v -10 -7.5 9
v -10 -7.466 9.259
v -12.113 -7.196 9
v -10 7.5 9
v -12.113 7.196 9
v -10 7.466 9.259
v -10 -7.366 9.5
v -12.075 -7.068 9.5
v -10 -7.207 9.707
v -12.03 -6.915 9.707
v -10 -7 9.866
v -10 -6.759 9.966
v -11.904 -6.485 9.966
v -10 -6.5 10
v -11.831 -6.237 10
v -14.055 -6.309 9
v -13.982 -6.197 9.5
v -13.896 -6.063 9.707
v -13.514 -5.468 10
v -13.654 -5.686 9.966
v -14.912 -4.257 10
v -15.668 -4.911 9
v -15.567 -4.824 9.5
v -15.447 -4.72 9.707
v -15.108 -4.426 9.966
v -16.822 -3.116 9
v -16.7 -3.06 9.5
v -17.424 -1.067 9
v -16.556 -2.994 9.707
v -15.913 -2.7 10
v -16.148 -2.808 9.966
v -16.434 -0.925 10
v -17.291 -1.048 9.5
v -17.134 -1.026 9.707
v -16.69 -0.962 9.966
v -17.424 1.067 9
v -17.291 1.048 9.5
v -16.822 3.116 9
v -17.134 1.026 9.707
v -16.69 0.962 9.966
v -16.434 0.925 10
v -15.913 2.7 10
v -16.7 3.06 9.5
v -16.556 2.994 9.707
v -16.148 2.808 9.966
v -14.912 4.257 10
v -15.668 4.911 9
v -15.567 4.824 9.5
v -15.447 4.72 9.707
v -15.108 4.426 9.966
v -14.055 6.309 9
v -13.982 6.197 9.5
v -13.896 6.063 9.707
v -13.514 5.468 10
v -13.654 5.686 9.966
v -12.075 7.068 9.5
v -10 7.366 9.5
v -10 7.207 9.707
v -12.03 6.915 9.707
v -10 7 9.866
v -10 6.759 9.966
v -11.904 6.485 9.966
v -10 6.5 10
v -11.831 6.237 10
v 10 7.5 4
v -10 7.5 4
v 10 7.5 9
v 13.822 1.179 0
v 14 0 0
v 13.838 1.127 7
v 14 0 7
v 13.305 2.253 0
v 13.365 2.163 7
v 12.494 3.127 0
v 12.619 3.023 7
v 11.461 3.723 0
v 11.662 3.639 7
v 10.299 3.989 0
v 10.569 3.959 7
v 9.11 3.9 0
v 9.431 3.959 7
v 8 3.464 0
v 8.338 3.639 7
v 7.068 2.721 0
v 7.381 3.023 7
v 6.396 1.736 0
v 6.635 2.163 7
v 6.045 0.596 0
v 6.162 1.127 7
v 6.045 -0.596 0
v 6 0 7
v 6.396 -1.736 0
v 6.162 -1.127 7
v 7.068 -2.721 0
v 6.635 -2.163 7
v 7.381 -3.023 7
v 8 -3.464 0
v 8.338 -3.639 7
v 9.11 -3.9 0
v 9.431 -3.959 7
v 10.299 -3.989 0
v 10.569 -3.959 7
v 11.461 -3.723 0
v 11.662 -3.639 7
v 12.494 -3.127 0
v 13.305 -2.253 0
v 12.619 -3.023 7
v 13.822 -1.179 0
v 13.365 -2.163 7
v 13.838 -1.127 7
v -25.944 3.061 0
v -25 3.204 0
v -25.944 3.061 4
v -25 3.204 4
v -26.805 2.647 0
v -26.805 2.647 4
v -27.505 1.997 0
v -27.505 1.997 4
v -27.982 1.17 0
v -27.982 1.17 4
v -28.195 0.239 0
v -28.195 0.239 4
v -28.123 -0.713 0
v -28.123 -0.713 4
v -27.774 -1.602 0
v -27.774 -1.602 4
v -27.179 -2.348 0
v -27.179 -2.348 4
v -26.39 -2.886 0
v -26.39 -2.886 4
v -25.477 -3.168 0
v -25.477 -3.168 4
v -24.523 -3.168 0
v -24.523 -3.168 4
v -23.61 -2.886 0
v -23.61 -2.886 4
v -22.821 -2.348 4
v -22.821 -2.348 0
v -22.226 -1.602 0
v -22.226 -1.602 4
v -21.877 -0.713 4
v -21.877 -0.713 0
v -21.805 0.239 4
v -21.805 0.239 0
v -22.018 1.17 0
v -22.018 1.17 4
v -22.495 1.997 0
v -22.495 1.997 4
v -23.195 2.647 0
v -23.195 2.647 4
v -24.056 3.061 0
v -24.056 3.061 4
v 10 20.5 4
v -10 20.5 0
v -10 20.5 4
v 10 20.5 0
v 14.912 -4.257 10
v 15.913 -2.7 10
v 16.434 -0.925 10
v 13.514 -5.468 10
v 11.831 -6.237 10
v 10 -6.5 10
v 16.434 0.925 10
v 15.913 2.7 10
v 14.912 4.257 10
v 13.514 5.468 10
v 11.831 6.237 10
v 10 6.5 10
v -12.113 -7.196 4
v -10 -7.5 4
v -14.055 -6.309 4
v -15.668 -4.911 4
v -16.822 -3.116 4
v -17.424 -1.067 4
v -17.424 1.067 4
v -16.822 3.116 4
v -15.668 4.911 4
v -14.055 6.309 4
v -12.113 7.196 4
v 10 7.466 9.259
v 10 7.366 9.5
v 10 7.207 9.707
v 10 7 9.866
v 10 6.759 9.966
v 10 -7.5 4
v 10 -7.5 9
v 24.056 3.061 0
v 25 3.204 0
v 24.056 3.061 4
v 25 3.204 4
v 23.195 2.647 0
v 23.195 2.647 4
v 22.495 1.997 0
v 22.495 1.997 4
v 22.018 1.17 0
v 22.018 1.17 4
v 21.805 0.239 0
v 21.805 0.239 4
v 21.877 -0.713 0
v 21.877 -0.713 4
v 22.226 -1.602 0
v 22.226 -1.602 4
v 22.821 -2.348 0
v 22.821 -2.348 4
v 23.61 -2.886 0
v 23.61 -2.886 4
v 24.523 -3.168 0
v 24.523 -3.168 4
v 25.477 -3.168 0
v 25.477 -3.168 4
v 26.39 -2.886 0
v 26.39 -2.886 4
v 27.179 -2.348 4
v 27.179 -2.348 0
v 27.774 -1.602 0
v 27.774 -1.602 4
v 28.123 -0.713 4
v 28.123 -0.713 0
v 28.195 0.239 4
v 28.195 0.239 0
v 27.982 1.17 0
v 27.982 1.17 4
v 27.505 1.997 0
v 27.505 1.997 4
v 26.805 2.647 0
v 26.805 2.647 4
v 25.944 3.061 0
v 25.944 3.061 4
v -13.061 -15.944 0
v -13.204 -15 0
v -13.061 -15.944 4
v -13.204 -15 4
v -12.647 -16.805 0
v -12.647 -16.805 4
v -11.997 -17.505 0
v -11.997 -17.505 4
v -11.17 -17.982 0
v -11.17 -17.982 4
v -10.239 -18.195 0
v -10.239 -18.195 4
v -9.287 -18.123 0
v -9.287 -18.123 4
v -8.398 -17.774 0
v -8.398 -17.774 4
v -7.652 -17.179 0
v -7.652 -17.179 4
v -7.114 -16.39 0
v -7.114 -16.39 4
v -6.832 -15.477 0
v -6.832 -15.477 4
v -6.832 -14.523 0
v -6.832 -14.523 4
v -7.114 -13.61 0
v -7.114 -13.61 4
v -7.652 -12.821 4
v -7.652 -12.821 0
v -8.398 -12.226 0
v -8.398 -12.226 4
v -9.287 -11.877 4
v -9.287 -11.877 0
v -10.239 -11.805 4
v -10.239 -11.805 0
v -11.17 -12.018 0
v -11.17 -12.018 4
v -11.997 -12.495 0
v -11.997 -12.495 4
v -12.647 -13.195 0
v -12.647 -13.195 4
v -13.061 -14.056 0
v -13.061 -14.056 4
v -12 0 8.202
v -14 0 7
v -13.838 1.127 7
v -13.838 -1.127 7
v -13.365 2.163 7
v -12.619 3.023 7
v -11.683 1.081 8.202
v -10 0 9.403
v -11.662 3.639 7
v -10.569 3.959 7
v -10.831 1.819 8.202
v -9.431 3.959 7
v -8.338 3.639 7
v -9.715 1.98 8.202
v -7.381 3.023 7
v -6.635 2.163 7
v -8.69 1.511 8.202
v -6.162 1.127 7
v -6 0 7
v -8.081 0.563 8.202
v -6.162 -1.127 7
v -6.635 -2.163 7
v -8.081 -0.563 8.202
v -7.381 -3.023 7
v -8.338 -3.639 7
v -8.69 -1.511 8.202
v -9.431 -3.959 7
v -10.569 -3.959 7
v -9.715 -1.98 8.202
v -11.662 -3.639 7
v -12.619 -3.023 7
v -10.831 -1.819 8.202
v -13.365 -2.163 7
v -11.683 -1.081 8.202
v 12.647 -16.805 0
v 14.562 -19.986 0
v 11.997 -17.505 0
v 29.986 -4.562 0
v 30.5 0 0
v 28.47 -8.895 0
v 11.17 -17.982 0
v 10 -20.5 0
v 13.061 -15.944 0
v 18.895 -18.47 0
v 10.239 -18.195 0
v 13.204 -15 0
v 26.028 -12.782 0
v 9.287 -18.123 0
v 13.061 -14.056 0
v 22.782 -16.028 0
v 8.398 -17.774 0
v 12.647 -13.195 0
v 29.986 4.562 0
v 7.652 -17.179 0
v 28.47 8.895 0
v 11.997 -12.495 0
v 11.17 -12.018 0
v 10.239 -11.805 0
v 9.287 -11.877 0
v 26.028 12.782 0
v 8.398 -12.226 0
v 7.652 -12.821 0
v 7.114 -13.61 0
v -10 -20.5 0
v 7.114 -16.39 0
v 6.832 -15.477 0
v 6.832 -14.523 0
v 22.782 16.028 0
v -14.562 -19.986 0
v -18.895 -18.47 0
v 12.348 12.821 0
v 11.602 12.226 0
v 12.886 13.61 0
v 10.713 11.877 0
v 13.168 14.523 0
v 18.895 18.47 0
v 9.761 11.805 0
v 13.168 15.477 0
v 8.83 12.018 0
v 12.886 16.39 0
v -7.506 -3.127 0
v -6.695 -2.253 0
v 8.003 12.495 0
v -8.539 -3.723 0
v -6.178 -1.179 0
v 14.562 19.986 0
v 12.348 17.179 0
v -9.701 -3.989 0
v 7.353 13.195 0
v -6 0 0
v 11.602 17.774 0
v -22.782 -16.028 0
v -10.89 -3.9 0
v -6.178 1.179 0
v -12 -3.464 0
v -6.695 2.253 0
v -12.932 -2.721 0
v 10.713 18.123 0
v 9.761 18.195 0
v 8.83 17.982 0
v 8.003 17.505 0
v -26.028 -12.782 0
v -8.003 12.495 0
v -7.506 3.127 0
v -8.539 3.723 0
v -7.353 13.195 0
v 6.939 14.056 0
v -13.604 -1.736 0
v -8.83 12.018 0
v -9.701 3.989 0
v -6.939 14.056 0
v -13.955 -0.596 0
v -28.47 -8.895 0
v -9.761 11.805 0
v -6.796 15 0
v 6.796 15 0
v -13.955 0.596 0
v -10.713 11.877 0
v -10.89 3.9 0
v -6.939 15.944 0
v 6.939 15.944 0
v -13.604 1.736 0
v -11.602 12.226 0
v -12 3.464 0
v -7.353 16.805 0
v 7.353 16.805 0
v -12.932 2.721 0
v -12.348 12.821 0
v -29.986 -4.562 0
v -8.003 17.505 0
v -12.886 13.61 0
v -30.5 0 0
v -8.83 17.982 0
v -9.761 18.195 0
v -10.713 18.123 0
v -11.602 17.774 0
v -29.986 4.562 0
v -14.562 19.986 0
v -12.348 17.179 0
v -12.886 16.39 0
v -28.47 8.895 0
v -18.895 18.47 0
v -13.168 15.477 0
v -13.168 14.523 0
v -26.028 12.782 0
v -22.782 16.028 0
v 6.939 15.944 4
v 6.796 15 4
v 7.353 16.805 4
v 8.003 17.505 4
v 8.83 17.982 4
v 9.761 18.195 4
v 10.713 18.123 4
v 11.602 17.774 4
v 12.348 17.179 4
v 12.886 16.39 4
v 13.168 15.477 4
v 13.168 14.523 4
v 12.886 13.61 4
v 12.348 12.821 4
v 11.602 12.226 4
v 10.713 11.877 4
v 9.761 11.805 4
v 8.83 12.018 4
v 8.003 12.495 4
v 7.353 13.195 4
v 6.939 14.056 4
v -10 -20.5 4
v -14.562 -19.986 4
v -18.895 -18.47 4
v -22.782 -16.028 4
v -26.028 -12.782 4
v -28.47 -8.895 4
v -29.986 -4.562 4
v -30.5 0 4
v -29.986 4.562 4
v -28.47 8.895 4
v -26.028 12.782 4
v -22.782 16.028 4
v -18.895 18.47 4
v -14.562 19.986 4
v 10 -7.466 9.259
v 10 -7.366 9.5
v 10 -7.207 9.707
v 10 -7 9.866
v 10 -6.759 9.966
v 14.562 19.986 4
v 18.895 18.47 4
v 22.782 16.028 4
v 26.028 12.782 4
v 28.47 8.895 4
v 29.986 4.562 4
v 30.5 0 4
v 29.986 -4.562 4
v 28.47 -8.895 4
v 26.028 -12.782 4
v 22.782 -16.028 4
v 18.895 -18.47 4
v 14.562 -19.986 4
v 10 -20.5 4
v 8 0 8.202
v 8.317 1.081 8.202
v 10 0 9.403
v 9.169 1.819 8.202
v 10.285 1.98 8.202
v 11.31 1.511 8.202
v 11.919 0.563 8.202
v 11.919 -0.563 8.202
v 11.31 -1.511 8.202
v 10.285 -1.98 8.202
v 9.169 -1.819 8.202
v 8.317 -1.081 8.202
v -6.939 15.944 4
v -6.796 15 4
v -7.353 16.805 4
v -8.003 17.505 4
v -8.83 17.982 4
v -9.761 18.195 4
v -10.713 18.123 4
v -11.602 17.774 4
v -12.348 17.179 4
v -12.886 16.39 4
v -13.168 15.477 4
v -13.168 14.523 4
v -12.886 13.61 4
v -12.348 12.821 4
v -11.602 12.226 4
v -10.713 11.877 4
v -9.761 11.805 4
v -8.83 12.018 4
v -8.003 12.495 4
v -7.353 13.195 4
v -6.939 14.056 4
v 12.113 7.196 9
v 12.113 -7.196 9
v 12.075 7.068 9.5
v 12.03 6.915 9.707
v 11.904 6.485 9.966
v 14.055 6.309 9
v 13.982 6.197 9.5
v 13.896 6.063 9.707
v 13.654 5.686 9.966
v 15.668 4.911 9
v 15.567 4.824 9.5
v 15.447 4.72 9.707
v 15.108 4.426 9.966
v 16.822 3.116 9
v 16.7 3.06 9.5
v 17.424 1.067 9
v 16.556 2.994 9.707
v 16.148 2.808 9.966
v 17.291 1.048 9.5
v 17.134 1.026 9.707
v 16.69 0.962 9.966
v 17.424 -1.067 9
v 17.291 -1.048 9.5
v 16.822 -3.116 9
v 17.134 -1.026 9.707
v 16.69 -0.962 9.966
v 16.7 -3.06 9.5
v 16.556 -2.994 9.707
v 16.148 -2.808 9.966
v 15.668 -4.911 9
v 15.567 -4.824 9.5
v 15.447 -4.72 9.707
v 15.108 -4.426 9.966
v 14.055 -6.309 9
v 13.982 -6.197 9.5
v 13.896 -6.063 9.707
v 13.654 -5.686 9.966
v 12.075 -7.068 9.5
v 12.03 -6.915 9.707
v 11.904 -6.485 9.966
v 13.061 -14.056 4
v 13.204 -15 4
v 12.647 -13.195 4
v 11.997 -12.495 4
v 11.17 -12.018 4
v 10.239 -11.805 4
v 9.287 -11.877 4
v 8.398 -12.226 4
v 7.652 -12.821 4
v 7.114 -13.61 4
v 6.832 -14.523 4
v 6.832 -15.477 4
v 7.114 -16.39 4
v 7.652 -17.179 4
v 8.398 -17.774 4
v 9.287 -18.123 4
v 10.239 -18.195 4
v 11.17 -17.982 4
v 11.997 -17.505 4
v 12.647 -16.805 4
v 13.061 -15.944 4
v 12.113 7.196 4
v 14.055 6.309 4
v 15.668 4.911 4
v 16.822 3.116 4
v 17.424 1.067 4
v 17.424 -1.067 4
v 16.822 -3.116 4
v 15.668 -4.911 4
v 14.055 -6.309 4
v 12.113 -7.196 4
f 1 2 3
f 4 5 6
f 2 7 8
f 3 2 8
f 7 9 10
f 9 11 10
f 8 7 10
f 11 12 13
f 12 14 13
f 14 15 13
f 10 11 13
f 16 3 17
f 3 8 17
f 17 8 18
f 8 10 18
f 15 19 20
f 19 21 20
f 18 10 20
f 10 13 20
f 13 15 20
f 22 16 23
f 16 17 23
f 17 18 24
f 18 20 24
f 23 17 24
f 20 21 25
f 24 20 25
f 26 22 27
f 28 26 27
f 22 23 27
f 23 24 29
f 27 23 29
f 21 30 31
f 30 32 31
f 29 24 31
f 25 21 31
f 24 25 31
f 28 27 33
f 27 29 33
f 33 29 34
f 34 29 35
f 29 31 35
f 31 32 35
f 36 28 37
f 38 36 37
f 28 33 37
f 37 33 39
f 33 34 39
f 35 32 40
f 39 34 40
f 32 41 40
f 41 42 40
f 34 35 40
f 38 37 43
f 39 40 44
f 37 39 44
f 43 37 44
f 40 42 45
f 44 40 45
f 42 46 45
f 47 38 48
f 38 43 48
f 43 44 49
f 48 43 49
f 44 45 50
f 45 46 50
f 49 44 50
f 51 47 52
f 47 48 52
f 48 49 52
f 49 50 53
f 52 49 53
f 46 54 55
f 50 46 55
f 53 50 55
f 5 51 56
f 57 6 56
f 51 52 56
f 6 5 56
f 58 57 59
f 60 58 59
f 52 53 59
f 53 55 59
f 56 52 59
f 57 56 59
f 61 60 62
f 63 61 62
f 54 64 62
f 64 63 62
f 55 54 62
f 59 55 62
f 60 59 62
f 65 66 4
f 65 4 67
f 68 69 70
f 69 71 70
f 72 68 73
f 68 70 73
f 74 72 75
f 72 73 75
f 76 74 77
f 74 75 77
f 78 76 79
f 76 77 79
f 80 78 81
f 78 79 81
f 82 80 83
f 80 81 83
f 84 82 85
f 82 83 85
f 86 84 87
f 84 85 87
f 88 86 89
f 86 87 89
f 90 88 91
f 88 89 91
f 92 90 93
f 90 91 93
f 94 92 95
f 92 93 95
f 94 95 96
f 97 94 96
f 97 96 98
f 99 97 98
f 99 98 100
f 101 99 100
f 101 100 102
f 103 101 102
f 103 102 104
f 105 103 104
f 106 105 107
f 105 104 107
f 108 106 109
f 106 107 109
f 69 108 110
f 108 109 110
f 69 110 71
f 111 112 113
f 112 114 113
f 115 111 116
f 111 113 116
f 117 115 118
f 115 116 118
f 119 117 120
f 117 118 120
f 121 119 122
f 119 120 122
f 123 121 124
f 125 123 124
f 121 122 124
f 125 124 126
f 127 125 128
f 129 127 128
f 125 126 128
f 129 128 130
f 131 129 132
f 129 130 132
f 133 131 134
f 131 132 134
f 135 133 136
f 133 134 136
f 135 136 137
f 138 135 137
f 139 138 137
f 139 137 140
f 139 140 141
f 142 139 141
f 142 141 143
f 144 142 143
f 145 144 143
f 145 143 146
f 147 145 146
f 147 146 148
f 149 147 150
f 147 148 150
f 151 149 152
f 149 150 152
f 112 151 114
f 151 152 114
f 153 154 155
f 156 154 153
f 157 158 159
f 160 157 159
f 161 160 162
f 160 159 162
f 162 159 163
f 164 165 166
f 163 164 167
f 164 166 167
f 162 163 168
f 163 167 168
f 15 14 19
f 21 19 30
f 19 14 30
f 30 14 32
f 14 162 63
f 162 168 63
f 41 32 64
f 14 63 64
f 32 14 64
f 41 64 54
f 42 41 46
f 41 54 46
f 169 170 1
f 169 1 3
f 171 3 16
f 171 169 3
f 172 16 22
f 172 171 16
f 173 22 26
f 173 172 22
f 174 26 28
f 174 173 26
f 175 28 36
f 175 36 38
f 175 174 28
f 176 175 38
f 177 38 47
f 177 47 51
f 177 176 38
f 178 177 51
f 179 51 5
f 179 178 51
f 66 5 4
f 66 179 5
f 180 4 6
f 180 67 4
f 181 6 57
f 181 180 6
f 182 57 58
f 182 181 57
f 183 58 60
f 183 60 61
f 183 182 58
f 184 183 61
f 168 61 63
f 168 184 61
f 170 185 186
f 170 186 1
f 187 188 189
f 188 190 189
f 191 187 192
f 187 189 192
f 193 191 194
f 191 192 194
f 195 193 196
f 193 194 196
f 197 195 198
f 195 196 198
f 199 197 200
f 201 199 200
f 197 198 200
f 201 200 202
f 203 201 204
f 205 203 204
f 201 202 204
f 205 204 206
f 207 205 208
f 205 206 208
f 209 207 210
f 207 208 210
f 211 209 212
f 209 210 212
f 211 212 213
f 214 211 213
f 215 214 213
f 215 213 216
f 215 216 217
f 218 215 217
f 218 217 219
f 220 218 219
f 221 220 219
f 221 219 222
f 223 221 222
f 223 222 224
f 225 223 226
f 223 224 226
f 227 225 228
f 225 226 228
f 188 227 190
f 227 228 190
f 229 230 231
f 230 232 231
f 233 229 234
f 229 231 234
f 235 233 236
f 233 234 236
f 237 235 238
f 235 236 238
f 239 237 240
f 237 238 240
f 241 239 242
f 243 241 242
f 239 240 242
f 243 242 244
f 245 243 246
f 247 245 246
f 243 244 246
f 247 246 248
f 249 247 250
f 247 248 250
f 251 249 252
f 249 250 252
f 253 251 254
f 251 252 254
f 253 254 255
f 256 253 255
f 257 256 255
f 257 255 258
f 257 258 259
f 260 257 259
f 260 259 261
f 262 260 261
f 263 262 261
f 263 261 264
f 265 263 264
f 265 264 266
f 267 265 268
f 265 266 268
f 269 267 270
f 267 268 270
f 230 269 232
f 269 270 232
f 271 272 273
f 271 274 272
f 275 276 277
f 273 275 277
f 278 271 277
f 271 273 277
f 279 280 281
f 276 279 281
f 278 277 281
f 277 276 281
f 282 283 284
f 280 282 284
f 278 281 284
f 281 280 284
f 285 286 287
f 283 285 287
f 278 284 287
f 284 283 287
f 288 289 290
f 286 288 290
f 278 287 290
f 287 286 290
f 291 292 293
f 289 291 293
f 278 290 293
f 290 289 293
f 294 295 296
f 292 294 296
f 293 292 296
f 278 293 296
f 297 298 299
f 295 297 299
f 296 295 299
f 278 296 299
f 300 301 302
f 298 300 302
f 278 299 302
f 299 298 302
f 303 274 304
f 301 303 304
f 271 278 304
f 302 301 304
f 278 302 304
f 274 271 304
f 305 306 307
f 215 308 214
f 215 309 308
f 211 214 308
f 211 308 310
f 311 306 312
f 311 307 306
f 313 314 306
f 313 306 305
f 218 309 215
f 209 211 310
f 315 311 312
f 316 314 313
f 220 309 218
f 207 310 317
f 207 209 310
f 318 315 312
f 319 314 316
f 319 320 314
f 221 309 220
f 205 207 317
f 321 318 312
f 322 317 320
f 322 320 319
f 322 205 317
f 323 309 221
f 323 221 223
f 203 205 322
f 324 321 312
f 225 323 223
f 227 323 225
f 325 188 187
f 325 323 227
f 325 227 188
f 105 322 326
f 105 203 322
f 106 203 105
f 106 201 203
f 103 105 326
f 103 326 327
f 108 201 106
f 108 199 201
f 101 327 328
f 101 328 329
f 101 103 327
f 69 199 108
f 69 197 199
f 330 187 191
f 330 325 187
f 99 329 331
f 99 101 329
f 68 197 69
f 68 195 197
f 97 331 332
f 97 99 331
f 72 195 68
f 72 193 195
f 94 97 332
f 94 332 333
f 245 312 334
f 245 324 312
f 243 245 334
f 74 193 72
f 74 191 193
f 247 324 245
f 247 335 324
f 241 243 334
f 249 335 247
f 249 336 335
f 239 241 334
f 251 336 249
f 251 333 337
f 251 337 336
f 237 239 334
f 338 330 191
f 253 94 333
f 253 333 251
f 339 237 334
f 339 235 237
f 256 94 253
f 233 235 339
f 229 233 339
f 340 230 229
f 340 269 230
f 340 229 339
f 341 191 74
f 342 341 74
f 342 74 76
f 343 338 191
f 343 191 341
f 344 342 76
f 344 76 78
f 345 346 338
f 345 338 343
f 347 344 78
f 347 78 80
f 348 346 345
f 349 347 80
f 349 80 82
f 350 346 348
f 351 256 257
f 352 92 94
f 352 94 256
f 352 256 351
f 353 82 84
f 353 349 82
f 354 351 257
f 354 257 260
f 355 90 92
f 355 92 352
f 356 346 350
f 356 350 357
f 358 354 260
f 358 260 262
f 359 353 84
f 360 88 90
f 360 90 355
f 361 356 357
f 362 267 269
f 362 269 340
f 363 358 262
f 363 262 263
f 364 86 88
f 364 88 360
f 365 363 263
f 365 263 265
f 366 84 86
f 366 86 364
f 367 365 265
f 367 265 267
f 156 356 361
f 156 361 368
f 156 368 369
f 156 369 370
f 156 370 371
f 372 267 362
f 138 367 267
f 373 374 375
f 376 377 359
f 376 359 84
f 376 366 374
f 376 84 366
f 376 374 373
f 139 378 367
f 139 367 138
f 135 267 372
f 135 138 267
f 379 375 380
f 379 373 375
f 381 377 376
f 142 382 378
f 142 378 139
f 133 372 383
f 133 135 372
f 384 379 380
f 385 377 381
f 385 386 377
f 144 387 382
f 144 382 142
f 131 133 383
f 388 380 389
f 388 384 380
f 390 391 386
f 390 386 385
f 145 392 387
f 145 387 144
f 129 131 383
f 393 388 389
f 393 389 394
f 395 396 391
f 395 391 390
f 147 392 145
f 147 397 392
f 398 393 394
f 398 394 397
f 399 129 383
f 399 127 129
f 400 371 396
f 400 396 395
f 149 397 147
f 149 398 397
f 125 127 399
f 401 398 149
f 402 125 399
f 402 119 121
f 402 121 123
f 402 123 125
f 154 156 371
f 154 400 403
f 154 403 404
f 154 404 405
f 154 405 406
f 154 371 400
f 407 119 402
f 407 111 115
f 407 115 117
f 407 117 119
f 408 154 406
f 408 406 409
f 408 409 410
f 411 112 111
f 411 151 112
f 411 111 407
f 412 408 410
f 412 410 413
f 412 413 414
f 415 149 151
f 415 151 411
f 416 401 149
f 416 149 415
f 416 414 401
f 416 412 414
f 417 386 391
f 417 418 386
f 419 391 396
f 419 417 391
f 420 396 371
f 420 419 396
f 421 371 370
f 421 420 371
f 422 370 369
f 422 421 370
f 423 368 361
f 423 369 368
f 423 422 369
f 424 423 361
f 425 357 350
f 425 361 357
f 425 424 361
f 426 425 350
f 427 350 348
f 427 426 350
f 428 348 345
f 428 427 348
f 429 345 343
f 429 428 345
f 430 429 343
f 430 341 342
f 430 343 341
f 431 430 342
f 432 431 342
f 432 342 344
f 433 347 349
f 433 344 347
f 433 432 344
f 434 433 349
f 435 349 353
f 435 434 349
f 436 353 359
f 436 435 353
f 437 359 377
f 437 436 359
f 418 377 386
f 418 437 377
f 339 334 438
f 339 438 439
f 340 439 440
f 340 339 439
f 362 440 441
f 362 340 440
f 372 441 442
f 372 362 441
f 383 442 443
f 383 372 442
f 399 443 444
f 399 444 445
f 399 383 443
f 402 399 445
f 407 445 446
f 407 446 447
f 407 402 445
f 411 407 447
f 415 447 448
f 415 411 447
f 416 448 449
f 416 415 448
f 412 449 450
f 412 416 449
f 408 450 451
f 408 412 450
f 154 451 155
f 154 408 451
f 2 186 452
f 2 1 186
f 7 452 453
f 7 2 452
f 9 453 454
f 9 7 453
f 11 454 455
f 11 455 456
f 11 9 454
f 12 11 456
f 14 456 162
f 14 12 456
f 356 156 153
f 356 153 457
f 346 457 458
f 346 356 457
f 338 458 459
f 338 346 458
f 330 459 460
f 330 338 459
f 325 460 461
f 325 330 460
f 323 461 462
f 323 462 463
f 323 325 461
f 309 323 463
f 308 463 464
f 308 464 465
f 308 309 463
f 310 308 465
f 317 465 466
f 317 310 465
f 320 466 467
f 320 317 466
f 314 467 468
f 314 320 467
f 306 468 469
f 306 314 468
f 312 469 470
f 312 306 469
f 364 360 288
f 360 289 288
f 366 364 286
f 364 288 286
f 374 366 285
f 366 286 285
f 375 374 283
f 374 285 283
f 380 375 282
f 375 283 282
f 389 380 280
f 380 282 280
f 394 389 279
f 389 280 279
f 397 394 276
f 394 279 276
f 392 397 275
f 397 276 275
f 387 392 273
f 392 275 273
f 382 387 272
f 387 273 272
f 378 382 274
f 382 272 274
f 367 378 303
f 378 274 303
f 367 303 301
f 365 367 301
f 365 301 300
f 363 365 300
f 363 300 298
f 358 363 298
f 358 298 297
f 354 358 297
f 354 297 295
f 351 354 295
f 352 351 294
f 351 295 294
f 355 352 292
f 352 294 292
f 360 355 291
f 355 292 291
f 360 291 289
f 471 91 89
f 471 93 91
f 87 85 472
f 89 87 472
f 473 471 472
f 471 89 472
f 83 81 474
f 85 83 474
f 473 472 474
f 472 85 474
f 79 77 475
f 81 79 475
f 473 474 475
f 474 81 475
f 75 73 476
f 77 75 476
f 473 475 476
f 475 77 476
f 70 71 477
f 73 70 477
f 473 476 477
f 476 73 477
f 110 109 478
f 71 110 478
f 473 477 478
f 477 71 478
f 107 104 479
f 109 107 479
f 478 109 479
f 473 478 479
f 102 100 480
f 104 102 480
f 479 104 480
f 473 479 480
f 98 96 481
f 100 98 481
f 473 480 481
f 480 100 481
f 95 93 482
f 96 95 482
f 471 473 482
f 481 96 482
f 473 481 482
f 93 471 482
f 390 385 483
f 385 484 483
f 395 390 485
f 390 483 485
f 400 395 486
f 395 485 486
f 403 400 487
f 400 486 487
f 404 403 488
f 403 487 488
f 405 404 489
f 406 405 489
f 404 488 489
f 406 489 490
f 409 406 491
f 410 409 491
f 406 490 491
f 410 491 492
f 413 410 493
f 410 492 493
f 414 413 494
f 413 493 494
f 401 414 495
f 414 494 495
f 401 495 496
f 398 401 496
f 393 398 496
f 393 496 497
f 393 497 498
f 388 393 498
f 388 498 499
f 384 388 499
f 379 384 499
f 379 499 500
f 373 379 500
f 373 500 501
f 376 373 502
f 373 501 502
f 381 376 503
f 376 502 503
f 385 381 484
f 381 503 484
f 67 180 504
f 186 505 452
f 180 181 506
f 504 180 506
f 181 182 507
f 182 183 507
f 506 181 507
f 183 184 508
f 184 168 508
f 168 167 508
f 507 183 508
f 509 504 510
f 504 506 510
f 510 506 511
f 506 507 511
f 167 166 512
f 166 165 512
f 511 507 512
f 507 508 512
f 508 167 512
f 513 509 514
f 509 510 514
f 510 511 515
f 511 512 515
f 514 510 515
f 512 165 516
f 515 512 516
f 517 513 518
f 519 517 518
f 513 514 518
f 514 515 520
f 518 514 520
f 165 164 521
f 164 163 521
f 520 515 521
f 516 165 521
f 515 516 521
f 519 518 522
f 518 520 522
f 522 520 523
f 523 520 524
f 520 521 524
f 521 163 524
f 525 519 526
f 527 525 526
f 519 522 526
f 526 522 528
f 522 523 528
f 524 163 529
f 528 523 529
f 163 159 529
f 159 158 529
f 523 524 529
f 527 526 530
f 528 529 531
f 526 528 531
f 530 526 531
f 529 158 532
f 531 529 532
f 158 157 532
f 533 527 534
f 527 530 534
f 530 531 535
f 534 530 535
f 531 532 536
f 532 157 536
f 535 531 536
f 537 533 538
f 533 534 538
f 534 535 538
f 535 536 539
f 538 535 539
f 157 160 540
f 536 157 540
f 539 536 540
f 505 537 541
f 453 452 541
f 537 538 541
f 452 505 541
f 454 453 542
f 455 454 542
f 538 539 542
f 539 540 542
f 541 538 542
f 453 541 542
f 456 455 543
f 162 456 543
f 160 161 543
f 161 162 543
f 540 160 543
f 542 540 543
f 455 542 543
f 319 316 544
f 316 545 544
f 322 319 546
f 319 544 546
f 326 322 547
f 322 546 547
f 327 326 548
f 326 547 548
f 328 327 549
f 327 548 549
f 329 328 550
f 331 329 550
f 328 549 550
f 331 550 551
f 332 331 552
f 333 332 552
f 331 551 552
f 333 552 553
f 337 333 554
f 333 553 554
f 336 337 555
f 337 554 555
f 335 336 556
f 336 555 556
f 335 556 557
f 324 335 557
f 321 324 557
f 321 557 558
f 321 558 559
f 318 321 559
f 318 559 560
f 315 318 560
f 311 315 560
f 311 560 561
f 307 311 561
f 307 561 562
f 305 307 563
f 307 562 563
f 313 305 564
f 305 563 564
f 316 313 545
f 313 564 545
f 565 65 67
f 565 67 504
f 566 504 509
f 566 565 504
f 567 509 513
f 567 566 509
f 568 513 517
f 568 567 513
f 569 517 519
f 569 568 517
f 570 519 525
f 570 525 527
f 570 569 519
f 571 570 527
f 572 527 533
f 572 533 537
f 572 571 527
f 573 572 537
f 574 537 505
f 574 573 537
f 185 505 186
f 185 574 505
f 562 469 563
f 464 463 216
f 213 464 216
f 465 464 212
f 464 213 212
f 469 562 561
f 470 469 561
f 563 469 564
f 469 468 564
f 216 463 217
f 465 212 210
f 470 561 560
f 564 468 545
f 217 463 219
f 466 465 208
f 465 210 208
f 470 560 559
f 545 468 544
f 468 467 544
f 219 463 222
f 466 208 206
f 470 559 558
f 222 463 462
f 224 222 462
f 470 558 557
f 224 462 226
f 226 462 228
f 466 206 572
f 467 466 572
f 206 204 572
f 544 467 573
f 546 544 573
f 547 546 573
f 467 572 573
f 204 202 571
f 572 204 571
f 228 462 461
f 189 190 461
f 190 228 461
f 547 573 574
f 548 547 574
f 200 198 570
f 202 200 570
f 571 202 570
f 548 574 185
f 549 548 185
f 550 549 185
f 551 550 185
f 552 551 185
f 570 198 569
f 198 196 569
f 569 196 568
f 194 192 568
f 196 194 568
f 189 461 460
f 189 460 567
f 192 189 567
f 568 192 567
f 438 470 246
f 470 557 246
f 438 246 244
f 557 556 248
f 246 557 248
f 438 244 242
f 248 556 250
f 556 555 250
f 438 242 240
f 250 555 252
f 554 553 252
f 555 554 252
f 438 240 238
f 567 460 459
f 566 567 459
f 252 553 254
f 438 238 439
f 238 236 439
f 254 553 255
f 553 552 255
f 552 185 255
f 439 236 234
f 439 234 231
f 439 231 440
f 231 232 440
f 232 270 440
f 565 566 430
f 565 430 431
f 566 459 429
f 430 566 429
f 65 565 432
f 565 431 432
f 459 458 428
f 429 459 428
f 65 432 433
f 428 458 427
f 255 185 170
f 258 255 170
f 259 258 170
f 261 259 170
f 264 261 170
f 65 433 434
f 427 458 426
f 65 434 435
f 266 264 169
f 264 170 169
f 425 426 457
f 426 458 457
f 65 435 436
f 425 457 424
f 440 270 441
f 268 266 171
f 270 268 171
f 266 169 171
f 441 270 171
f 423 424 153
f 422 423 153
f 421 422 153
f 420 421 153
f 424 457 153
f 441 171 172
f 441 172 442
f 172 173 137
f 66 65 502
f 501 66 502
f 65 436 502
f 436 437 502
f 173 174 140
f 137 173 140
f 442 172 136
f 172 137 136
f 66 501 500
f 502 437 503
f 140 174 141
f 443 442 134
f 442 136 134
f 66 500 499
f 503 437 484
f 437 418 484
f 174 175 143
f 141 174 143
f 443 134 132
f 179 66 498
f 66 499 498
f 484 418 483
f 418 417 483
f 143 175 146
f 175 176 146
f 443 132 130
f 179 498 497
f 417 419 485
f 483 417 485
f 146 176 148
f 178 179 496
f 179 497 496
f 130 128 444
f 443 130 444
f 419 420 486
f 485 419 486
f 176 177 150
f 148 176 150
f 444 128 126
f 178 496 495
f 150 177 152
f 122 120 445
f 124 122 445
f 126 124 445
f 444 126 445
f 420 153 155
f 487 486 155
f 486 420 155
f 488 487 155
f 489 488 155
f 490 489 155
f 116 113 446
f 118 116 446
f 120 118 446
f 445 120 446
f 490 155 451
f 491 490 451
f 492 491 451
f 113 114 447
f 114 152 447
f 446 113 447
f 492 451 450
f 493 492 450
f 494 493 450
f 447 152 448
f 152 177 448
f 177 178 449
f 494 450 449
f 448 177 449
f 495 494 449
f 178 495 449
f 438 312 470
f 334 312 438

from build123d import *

# Parameters (mm, degrees)
EXTRUDE_1_DEPTH           = 4
EXTRUDE_2_DEPTH           = 6
HOLE_WIZARD_8_0_8_1_D     = 8
HOLE_WIZARD_8_0_8_1_DEPTH = 7
HOLE_WIZARD_8_0_8_1_TIP   = 2.403442476
FILLET_2_R                = 1
SKETCH_10_R               = 3.203547284
CUT_EXTRUDE_1_DEPTH       = 38.235735524
PATTERN_CIRCULAR_1_COUNT  = 3
PATTERN_CIRCULAR_1_ANGLE  = 180
MIRROR_1_COPY_1_SKETCH_R  = 3.203547284
MIRROR_1_COPY_1_DEPTH     = 38.235735524
MIRROR_1_COPY_2_SKETCH_R  = 3.203547284
MIRROR_1_COPY_2_DEPTH     = 38.235735524


with BuildPart() as part:
    # 草图1 → 凸台-拉伸1 (new body)
    with BuildSketch(Plane.XY):
        with BuildLine():
            Line((-10, 20.5), (10, 20.5))
            ThreePointArc((10, 20.5), (30.5, 0), (10, -20.5))
            Line((10, -20.5), (-10, -20.5))
            ThreePointArc((-10, -20.5), (-30.5, 0), (-10, 20.5))
        make_face()
    extrude(amount=EXTRUDE_1_DEPTH)

    # 草图2 → 凸台-拉伸2 (add)
    with BuildSketch(Plane.XY.offset(4)):
        with BuildLine():
            Line((-10, 7.5), (10, 7.5))
            ThreePointArc((10, 7.5), (17.5, 0), (10, -7.5))
            Line((10, -7.5), (-10, -7.5))
            ThreePointArc((-10, -7.5), (-17.5, 0), (-10, 7.5))
        make_face()
    extrude(amount=EXTRUDE_2_DEPTH)

    # Ø8.0 (8) 直径孔1
    with Locations(Plane(origin=(0, 0, 0), x_dir=(-1, 0, 0), z_dir=(0, 0, -1))):
        with Locations((-10, 0), (10, 0)):
            Hole(HOLE_WIZARD_8_0_8_1_D / 2, depth=HOLE_WIZARD_8_0_8_1_DEPTH)
            with Locations((0, 0, -(HOLE_WIZARD_8_0_8_1_DEPTH + HOLE_WIZARD_8_0_8_1_TIP / 2))):  # 118° drill point
                Cone(0, HOLE_WIZARD_8_0_8_1_D / 2, HOLE_WIZARD_8_0_8_1_TIP, mode=Mode.SUBTRACT)

    # 圆角2
    fillet_2_edges = [part.edges().sort_by_distance(p)[0] for p in [
        (-17.5, 0, 10),
        (0, -7.5, 10),
        (17.5, 0, 10),
        (0, 7.5, 10),
    ]]
    fillet(fillet_2_edges, radius=FILLET_2_R)

    # 草图10 → 切除-拉伸1 (cut, symmetric)
    with BuildSketch(Plane.XY.offset(4)):
        with Locations((-10, 15)):
            Circle(SKETCH_10_R)
    cut_extrude_1 = extrude(amount=CUT_EXTRUDE_1_DEPTH, both=True, mode=Mode.SUBTRACT)

    # 阵列(圆周)1: 切除-拉伸1 ×3 about axis
    pattern_circular_1_axis = Axis((-10, 0, 0), (0, 0, 1))
    for i in range(1, PATTERN_CIRCULAR_1_COUNT):
        add(cut_extrude_1.rotate(pattern_circular_1_axis, i * PATTERN_CIRCULAR_1_ANGLE / (PATTERN_CIRCULAR_1_COUNT - 1)), mode=Mode.SUBTRACT)

    # 镜向1: 切除-拉伸1 across plane
    add(cut_extrude_1.mirror(Plane(origin=(0, 0, 0), x_dir=(0, 0, 1), z_dir=(1, 0, 0))), mode=Mode.SUBTRACT)

    # 镜向1 copy 1 sketch → 镜向1 copy 1 (cut, symmetric)
    with BuildSketch(Plane(origin=(10, 10, 4), x_dir=(0, 1, 0), z_dir=(0, 0, 1))):
        with Locations((-10, -15)):
            Circle(MIRROR_1_COPY_1_SKETCH_R)
    extrude(amount=MIRROR_1_COPY_1_DEPTH, both=True, mode=Mode.SUBTRACT)

    # 镜向1 copy 2 sketch → 镜向1 copy 2 (cut, symmetric)
    with BuildSketch(Plane(origin=(20, 0, 4), x_dir=(1, 0, 0), z_dir=(0, 0, 1))):
        with Locations((-10, -15)):
            Circle(MIRROR_1_COPY_2_SKETCH_R)
    extrude(amount=MIRROR_1_COPY_2_DEPTH, both=True, mode=Mode.SUBTRACT)


solid = part.part
